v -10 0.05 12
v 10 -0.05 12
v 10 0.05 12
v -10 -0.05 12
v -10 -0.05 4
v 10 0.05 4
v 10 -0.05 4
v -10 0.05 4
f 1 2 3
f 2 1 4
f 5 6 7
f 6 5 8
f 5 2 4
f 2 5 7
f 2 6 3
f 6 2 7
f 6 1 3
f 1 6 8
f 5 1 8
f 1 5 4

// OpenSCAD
use <lib.scad>

//module corvettePlatform() {
//	translate([0,0,0.5]) box([30,15,1]);
//}
//
//corvettePlatform();
//
//module destroyerPlatform() {
//	translate([0,0,0.5]) box([60,30,1]);
//}
//
//destoyerPlatform();

module shipyard2SubFrame() {
	translate([0,0,2]) rotate([90,0,0]) union() {
		difference() {
			cyl(18,18,1,$fn=32);
			cyl(17,17,2,$fn=32);
			translate([9,0,0]) box([20,50,20]);
			translate([0,-10,0]) box([50,20,20]);
		}
	}
}

module shipyard2Frame() {
	translate([]) union() {
		translate([0,15,0]) shipyard2SubFrame();
		translate([0,0,0]) shipyard2SubFrame();
		translate([0,-15,0]) shipyard2SubFrame();
		translate([-0.55,0,19.5]) box([1,34,1]);
	}
}

module shipyard2Frames() {
	rotate([0,0,0]) shipyard2Frame();
	rotate([0,0,180]) shipyard2Frame();
}

module shipyard2Lift() {
	hull() {
		translate([0,15,1.5]) cyl(12,12,1,$fn=8);
		translate([0,-15,1.5]) cyl(12,12,1,$fn=8);
	}
}

module shipyard2ScreenShort() {
	translate([0,0,8]) box([20,0.1,8]);
}

module shipyard2ScreenLong() {
	translate([0,0,8]) box([0.1,42,8]);
}

module shipyard2() {
	difference() {
		hull() {
			translate([0,0,1]) box([40,60,2]);
			translate([0,14,11]) cyl(13.5,13.5,1,$fn=8);
			translate([0,-14,11]) cyl(13.5,13.5,1,$fn=8);
		}
		hull() {
			translate([0,14,6]) cyl(12.5,12.5,11.5,$fn=8);
			translate([0,-14,6]) cyl(12.5,12.5,11.5,$fn=8);
		}
		translate([16.5,-15,26]) box([4,1.5,50]);
		translate([16.5,0,26]) box([4,1.5,50]);
		translate([16.5,15,26]) box([4,1.5,50]);
		translate([-16.5,-15,26]) box([4,1.5,50]);
		translate([-16.5,0,26]) box([4,1.5,50]);
		translate([-16.5,15,26]) box([4,1.5,50]);
	}
}

//shipyard2();
//shipyard2Lift();
//shipyard2Frames();
shipyard2ScreenShort();
//shipyard2ScreenLong();
